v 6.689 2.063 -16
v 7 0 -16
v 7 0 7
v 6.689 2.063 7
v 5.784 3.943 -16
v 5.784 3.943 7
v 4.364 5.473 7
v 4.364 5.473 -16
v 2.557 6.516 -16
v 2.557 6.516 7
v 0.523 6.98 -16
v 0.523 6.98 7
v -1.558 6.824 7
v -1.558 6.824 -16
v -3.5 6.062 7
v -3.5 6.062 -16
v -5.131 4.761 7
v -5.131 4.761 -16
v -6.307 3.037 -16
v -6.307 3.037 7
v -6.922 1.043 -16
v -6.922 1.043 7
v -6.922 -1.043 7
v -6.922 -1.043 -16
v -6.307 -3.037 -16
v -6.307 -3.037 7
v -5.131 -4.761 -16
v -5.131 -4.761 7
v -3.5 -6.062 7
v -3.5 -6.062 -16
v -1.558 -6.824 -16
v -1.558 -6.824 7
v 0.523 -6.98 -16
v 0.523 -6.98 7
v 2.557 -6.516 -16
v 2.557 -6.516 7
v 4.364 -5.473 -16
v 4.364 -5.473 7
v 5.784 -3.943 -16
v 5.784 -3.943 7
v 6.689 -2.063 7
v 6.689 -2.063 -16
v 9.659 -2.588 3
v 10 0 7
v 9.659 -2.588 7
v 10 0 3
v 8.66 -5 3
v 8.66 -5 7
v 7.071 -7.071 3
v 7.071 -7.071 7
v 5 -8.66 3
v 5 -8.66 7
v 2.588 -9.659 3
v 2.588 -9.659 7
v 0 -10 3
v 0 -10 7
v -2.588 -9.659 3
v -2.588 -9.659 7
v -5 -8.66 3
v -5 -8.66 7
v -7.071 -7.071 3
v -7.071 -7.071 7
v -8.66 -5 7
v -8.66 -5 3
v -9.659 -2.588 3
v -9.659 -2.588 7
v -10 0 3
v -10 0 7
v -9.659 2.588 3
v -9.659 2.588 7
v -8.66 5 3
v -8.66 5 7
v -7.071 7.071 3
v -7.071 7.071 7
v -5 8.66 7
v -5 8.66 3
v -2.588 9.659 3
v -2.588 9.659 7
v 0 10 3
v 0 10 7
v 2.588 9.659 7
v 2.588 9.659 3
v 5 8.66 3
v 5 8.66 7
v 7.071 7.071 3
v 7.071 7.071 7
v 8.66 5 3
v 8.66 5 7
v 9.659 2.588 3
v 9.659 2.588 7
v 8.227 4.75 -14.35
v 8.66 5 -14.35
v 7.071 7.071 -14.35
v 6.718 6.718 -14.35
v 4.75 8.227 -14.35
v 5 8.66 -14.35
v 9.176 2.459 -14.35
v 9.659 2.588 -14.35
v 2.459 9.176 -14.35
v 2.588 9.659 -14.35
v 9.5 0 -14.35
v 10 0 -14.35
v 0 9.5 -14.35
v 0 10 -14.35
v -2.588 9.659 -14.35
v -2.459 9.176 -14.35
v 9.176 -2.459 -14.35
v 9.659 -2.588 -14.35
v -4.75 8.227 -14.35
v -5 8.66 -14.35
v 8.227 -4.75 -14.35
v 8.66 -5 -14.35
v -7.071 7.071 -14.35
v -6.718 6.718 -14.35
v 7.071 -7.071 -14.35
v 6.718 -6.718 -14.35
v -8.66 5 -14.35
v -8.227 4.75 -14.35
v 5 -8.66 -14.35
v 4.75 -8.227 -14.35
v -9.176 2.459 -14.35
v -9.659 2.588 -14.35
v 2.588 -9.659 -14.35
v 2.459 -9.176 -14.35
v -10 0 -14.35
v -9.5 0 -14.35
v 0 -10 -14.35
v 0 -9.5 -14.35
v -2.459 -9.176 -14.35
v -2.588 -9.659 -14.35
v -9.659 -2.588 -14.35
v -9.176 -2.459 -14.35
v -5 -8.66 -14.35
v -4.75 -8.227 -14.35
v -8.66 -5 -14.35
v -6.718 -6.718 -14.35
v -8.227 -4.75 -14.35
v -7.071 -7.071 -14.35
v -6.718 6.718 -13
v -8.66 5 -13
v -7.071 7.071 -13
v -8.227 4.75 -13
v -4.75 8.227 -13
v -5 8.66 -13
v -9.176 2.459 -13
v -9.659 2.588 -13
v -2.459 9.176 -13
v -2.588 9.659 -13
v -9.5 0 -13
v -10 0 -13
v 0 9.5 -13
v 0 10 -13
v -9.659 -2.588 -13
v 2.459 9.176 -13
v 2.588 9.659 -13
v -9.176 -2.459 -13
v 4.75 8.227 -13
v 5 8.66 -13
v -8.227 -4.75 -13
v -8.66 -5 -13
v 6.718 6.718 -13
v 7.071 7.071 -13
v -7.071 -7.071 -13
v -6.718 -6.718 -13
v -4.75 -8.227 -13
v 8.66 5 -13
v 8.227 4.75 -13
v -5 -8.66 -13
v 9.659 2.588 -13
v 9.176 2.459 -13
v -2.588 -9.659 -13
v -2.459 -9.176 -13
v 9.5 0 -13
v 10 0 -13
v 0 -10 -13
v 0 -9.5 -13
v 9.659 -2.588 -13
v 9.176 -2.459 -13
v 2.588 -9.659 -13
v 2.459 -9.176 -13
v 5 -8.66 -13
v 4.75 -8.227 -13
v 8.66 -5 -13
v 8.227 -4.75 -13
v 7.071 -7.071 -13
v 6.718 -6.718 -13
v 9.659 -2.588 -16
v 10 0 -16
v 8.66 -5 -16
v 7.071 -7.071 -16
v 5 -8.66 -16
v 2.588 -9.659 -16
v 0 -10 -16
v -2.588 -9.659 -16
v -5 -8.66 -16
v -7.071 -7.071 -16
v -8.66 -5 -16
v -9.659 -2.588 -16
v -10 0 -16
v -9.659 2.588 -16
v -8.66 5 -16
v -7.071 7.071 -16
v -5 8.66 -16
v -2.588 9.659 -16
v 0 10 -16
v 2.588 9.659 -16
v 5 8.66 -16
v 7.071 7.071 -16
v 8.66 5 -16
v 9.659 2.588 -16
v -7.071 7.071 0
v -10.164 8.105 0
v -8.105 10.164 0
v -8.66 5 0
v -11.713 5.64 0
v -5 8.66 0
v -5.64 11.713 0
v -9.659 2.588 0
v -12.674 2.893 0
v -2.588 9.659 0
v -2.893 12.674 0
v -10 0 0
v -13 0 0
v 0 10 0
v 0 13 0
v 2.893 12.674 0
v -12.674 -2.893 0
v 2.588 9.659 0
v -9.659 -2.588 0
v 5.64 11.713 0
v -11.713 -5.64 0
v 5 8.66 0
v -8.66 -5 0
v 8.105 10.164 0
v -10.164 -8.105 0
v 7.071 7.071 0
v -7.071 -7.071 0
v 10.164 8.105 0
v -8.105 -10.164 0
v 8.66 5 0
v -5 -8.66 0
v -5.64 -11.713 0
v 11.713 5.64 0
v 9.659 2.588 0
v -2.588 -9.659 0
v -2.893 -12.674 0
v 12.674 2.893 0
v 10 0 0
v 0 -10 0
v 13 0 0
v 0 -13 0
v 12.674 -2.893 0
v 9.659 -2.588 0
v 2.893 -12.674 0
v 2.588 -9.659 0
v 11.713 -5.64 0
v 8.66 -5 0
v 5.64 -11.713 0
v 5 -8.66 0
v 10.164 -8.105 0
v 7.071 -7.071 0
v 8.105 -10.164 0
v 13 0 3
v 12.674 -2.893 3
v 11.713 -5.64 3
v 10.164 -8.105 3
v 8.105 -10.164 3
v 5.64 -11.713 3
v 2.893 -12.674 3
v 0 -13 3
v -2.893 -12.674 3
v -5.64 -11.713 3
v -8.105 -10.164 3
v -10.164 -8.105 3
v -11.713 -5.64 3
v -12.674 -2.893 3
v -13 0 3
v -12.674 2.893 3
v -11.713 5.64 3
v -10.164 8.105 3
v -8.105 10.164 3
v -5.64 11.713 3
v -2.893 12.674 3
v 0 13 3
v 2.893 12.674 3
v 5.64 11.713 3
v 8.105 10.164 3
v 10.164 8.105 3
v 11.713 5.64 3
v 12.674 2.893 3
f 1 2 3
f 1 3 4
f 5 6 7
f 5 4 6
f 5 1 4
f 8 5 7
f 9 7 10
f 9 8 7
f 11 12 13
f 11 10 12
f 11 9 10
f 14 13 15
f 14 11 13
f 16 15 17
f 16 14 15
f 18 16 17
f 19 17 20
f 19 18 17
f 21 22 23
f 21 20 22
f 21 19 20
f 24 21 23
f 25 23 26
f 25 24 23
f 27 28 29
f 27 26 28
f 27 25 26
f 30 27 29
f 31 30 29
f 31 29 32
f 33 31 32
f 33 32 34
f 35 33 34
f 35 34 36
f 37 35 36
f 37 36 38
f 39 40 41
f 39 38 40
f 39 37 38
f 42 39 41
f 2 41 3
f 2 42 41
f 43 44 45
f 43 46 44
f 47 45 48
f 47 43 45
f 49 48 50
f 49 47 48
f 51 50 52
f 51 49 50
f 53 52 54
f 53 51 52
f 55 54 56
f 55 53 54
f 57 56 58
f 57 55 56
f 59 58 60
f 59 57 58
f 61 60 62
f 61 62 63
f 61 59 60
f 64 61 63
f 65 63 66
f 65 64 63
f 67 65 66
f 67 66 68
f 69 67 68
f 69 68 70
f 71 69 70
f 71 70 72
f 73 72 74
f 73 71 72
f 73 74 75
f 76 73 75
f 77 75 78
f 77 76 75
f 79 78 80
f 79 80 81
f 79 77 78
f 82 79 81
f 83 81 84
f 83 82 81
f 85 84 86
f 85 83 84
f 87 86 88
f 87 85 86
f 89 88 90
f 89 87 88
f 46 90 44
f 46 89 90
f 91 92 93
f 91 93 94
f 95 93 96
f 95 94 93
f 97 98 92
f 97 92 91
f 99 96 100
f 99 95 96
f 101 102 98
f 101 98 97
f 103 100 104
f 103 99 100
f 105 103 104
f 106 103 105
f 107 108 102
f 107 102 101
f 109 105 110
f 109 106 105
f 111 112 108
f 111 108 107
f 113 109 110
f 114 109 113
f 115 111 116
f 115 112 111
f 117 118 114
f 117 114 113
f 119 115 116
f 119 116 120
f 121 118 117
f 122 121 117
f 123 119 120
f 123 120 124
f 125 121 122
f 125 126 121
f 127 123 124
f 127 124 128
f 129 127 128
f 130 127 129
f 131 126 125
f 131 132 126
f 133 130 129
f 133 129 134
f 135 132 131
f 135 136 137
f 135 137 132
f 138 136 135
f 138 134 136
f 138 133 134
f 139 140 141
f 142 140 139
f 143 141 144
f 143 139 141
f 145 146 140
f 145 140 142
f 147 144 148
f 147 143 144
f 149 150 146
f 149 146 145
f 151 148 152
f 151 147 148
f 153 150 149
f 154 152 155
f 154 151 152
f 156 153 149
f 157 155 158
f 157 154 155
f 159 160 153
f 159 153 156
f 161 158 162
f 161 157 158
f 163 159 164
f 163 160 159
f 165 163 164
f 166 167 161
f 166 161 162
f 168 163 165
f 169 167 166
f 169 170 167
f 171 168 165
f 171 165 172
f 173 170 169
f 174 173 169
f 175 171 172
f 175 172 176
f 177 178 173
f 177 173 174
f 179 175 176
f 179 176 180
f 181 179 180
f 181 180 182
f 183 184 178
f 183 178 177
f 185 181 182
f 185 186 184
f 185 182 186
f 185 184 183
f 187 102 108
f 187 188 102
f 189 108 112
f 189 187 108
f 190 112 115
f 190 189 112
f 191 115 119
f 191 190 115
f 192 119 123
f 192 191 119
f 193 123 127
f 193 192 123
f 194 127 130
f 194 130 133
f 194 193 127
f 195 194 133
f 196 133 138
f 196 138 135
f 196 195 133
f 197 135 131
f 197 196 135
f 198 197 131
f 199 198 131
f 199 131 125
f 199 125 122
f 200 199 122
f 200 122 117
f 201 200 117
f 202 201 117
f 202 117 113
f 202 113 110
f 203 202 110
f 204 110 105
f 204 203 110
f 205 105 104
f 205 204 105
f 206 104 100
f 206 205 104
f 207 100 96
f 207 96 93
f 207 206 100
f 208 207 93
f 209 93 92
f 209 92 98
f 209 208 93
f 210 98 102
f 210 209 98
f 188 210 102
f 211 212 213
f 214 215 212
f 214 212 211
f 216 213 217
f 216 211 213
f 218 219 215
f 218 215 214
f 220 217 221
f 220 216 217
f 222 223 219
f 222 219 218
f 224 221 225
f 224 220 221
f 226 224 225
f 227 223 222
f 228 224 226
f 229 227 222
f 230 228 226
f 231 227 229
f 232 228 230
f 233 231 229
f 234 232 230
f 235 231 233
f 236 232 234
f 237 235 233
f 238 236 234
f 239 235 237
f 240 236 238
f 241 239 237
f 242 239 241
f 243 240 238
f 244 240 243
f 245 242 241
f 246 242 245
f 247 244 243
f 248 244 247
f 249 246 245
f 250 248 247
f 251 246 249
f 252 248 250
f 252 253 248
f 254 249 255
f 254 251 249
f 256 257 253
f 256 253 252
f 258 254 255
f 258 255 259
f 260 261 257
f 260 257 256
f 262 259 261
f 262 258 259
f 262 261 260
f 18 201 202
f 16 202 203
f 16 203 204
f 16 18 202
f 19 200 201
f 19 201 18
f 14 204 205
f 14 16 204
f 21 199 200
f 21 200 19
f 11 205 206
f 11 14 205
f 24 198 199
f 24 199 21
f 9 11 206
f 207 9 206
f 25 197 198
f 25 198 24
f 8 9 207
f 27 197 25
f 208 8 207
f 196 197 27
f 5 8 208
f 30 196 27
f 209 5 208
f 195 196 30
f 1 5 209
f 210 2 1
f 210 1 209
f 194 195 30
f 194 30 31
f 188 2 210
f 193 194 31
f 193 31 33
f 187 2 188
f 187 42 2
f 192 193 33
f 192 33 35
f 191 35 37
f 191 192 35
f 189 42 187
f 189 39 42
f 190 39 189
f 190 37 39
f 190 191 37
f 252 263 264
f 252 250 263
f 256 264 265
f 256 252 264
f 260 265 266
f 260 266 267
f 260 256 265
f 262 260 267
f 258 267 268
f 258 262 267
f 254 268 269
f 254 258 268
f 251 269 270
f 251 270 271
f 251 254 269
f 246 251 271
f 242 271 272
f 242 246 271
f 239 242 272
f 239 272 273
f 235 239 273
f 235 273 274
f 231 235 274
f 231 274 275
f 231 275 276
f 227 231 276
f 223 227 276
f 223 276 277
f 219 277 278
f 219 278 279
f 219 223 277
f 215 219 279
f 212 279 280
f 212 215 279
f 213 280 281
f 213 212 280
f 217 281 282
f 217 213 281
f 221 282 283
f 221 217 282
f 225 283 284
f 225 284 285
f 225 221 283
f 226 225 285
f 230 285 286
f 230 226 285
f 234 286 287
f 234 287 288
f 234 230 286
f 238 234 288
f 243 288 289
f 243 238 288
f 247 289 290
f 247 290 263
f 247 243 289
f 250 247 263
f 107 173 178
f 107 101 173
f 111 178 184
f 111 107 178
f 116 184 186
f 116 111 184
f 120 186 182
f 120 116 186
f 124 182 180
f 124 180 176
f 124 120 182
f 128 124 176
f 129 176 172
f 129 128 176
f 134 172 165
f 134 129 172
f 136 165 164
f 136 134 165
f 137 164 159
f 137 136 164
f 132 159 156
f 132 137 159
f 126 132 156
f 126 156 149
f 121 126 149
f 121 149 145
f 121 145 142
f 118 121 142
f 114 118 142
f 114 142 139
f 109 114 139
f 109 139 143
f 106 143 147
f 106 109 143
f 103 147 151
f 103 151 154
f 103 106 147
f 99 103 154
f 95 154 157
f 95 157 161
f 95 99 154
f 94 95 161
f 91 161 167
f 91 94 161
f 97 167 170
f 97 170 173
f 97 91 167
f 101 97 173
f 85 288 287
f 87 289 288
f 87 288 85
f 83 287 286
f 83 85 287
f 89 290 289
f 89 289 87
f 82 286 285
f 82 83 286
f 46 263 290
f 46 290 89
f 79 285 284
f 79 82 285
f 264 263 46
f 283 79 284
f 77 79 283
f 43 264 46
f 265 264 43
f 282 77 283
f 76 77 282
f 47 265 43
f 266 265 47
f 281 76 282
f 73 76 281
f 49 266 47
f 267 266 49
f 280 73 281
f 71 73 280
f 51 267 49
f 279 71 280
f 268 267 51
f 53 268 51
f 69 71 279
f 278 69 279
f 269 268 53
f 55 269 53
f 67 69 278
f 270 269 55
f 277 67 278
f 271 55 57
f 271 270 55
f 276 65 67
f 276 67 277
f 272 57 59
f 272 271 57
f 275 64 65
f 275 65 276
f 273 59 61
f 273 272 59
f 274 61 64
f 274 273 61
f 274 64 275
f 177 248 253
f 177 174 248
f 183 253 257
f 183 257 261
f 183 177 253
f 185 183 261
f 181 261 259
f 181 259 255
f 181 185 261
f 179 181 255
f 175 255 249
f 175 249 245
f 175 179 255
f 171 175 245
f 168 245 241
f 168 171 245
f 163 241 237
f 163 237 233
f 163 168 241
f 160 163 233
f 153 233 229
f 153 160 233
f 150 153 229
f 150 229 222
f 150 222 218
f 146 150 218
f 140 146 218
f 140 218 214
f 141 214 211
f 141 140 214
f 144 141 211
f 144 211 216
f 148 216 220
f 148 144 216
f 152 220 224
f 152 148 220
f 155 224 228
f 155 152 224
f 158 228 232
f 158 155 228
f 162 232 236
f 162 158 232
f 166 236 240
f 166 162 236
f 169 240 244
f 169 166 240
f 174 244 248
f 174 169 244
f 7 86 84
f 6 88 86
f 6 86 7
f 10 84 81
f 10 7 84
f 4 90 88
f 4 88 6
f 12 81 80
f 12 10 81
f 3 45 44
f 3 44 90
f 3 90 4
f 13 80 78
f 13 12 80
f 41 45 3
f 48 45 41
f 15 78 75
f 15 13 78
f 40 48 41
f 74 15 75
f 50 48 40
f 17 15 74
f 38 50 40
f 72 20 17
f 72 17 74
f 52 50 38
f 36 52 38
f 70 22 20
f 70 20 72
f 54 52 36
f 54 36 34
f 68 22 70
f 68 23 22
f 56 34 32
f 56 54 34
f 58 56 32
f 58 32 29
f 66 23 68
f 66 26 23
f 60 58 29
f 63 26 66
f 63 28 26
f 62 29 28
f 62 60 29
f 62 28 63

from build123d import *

# Parameters (mm, degrees)
CUT_EXTRUDE1_DEPTH      = 30.444863729
CUT_EXTRUDE1_DEPTH_BACK = 30.444863729
SKETCH3_R               = 7


with BuildPart() as part:
    # Sketch2 → Revolve1 (revolve)
    with BuildSketch(Plane.YZ, mode=Mode.PRIVATE) as revolve1_sk:
        Polygon((0, 7), (10, 7), (10, 3), (13, 3), (13, 0), (10, 0), (10, -13), (9.5, -13), (9.5, -14.35), (10, -14.35), (10, -16), (0, -16), align=None)
    revolve(revolve1_sk.sketch.rotate(Axis((0, 0, 15.904017857), (0, 0, -1)), 90), axis=Axis((0, 0, 15.904017857), (0, 0, -1)))

    # Sketch3 → Cut-Extrude1 (cut, two sides: drawn at the far end of the back side and taken through both)
    with BuildSketch(Plane.XY.offset(7).offset(-CUT_EXTRUDE1_DEPTH_BACK)):
        Circle(SKETCH3_R)
    extrude(amount=CUT_EXTRUDE1_DEPTH + CUT_EXTRUDE1_DEPTH_BACK, mode=Mode.SUBTRACT)


solid = part.part
